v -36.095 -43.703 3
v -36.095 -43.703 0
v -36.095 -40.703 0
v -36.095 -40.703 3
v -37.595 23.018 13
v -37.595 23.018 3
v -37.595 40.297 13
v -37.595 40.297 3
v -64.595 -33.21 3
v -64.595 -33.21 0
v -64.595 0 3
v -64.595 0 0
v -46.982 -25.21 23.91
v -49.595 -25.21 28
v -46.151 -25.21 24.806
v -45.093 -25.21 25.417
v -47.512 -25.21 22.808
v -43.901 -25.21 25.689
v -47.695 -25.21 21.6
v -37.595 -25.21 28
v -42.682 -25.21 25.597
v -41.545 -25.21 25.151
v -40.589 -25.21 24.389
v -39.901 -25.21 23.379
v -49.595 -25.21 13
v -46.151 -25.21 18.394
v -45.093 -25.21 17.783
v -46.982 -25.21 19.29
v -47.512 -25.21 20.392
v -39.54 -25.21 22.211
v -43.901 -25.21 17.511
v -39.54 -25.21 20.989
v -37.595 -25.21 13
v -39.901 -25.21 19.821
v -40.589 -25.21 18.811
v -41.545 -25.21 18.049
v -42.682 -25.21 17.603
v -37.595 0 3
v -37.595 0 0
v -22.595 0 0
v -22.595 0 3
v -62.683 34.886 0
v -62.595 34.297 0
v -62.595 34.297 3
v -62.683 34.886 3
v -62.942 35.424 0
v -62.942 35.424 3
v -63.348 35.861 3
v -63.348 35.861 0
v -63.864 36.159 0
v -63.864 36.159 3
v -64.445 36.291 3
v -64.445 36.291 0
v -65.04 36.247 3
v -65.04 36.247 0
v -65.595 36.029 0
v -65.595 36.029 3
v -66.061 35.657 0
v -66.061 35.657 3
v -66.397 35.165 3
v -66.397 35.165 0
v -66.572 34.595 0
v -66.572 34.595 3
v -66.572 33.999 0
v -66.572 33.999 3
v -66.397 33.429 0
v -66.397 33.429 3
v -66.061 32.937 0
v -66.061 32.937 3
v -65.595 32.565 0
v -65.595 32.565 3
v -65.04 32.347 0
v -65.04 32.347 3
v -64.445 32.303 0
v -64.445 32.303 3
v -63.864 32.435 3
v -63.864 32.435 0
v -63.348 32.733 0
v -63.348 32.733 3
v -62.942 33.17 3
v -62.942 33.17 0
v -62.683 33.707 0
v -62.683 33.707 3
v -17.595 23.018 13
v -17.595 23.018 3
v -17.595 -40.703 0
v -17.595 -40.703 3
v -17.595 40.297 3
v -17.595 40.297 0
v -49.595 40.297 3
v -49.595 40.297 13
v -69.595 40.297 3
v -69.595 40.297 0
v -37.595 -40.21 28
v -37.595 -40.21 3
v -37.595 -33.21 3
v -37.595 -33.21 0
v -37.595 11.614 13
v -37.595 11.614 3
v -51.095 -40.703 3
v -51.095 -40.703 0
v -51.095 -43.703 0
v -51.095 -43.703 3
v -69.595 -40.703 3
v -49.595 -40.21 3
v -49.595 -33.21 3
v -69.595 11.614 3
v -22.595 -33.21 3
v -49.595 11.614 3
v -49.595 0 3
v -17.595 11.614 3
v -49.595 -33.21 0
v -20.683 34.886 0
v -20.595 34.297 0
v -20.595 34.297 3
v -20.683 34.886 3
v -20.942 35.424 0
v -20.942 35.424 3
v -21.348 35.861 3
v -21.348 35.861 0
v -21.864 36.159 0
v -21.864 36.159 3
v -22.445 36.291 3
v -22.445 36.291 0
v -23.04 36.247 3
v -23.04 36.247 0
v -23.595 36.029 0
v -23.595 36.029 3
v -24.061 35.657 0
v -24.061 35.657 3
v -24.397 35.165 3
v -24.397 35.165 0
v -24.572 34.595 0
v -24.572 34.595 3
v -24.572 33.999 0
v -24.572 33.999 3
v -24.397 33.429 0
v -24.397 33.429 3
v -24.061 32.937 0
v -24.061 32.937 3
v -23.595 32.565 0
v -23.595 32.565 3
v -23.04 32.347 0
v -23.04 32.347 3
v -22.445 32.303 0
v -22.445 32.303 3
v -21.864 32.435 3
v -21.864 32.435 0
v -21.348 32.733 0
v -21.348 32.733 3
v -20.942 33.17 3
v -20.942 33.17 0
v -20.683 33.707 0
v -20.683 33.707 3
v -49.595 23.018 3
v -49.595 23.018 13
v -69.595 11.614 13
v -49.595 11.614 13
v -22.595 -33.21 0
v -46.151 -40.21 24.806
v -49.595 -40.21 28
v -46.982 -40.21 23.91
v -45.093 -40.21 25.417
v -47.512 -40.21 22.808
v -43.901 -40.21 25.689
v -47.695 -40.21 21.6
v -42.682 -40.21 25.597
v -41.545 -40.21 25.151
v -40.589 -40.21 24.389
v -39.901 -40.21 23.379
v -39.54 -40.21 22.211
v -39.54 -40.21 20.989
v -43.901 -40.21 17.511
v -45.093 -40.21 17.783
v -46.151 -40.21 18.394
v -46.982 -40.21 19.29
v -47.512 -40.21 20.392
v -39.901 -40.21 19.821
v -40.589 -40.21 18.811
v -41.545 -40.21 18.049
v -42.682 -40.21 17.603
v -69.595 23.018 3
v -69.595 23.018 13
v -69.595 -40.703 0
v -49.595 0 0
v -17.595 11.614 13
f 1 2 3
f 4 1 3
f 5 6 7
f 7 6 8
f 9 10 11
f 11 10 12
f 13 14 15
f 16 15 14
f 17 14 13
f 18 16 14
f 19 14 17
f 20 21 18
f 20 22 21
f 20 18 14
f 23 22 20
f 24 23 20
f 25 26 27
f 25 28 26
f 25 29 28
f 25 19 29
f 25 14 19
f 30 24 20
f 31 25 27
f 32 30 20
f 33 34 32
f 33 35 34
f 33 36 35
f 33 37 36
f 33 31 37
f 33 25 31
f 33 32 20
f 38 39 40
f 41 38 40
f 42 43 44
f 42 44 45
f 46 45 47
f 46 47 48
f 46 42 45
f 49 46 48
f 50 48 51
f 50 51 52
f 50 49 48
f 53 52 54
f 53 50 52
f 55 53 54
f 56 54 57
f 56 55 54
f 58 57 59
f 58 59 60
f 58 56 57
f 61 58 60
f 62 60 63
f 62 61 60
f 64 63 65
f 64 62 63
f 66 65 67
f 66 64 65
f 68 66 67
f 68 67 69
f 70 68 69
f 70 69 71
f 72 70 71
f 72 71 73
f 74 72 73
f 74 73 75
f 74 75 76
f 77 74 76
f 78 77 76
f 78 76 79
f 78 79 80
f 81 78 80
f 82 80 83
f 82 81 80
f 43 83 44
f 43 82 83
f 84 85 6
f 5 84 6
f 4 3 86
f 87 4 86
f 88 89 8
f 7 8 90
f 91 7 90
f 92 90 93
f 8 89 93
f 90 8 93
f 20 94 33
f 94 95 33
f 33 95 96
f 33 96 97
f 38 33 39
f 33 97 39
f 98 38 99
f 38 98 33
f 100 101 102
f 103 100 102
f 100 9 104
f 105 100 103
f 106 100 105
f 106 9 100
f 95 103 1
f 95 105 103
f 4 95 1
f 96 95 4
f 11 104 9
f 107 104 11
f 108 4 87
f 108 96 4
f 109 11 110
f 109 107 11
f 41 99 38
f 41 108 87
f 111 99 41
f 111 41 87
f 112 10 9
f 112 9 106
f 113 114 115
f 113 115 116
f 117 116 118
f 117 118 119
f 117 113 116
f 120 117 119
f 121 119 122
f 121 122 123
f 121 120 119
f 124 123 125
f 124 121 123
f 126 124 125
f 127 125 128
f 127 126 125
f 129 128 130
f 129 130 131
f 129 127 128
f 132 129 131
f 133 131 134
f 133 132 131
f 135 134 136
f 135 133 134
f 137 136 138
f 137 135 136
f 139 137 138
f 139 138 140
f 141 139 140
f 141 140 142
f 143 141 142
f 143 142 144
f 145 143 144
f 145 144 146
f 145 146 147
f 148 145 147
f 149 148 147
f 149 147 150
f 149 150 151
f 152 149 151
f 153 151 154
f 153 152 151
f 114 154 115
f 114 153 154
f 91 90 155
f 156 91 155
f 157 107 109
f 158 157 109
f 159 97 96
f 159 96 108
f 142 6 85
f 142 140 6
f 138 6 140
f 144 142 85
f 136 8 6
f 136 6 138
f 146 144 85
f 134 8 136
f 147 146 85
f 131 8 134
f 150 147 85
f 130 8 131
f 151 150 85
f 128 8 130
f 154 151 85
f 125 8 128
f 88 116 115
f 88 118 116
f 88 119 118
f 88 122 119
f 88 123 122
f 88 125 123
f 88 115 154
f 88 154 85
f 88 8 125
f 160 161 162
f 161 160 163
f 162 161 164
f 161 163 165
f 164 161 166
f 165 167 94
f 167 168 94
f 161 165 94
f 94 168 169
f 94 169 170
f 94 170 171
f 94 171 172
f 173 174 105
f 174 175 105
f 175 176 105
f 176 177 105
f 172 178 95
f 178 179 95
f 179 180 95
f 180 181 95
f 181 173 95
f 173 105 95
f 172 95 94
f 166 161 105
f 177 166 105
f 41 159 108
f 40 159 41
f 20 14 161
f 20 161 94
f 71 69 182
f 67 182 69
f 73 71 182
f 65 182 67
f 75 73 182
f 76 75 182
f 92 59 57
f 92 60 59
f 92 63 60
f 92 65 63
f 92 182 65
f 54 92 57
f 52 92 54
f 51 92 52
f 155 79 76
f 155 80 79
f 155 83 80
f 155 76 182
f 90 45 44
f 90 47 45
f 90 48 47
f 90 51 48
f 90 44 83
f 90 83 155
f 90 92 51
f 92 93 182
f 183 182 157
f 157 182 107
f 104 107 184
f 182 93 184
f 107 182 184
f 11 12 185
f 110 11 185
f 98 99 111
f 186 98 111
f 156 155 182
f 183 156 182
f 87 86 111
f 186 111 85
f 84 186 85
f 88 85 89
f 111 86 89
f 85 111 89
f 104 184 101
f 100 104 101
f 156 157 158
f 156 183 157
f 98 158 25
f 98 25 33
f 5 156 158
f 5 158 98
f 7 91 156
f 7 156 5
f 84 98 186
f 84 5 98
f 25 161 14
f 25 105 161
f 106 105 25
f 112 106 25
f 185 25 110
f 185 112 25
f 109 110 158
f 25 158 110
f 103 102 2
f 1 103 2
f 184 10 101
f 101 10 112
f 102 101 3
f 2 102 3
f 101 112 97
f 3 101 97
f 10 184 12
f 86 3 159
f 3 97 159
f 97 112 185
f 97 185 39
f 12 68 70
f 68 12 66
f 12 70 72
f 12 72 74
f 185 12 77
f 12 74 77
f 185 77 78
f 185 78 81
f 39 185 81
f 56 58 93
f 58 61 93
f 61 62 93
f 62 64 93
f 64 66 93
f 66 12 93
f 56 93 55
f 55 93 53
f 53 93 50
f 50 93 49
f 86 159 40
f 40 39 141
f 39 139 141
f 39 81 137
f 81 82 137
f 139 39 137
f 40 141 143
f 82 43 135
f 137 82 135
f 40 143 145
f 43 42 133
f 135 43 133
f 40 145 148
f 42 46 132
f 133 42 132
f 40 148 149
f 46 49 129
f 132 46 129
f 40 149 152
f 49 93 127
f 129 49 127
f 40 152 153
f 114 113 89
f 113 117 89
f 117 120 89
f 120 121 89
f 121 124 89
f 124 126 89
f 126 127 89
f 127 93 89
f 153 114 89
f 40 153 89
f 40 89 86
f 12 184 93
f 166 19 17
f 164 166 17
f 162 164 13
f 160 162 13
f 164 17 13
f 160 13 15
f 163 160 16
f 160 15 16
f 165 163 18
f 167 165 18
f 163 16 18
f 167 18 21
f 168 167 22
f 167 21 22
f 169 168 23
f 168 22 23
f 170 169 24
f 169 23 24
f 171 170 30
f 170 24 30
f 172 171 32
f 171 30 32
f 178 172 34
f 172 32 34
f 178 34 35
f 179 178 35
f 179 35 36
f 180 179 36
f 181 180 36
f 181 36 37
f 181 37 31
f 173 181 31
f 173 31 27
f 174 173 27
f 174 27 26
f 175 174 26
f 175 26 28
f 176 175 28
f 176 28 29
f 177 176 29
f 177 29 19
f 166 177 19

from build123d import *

# Parameters (mm, degrees)
F0_W     = 15
F0_H     = 33.2100428641
F0_W_2   = 15.0000001043
F0_R     = 2
F1_DEPTH = 3
F3_DEPTH = 10
F4_W     = 12
F4_H     = 15
F5_DEPTH = 15
F6_R     = 4.1
F7_DEPTH = 25


with BuildPart() as f1:
    # F0 (on Top) → F1 (new body)
    with BuildSketch(Plane.XY):
        Polygon((-36.0946140587, -40.7030668556), (-17.5946140587, -40.7030668556), (-17.5946140587, 40.2969331444), (-69.5946140587, 40.2969331444), (-69.5946140587, -40.7030668556), (-51.0946140587, -40.7030668556), align=None)
        with Locations((-57.0946140587, -16.605021432)):
            Rectangle(F0_W, F0_H, mode=Mode.SUBTRACT)
        with Locations((-30.0946140066, -16.605021432)):
            Rectangle(F0_W_2, F0_H, mode=Mode.SUBTRACT)
        with Locations((-64.5946140587, 34.2969331444)):
            Circle(F0_R, mode=Mode.SUBTRACT)
        with Locations((-22.5946139544, 34.2969331444)):
            Circle(F0_R, mode=Mode.SUBTRACT)
        Polygon((-36.0946140587, -43.7030668556), (-36.0946140587, -40.7030668556), (-51.0946140587, -40.7030668556), (-51.0946140587, -43.7030668556), (-43.5946140587, -43.7030668556), align=None)
    extrude(amount=F1_DEPTH)

    # F2 (on face) → F3 (join)
    with BuildSketch(Plane.XY.offset(3)):
        Polygon((-49.5946140587, 11.6144362837), (-49.5946140587, 0), (-49.5946140587, -33.2100428641), (-49.5946140587, -40.2100428641), (-37.5946140587, -40.2100428641), (-37.5946140587, -33.2100428641), (-37.5946140587, 0), (-37.5946140587, 11.6144362837), (-17.5946140587, 11.6144362837), (-17.5946140587, 23.017546162), (-37.5946140587, 23.017546162), (-37.5946140587, 40.2969331444), (-49.5946140587, 40.2969331444), (-49.5946140587, 23.017546162), (-69.5946140587, 23.017546162), (-69.5946140587, 11.6144362837), align=None)
    extrude(amount=F3_DEPTH)

    # F4 (on face) → F5 (join)
    with BuildSketch(Plane.XY.offset(13)):
        with Locations((-43.5946140587, -32.7100428641)):
            Rectangle(F4_W, F4_H)
    extrude(amount=F5_DEPTH)

    # F6 (on face) → F7 (cut)
    with BuildSketch(Plane(origin=(0, -25.2100428641, 0), x_dir=(-1, 0, 0), z_dir=(0, 1, 0))):
        with Locations((43.5946140587, 21.6)):
            Circle(F6_R)
    extrude(amount=-F7_DEPTH, mode=Mode.SUBTRACT)


solid = f1.part
